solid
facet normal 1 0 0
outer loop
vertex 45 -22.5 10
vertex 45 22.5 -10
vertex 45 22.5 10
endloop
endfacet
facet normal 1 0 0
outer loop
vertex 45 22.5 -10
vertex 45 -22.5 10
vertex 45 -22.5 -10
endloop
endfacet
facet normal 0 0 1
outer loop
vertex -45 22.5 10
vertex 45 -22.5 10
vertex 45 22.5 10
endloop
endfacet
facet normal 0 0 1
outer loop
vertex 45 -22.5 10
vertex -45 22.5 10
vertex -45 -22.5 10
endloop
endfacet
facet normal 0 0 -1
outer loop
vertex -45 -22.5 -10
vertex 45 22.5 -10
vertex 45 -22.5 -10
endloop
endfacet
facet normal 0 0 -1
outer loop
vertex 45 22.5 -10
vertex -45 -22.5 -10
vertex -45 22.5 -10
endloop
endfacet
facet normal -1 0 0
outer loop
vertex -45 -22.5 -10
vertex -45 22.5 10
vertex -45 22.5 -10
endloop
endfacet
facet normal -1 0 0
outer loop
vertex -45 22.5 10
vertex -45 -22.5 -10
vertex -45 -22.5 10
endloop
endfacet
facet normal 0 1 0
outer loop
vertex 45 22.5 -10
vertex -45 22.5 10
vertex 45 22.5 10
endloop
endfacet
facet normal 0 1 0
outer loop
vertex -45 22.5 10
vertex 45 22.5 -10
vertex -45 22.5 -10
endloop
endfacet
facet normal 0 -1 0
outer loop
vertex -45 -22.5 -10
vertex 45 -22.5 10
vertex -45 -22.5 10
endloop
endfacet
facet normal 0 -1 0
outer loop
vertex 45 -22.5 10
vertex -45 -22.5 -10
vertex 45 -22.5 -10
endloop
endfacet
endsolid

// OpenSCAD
// Dimensions for the drying rack
$fn = 64; // Smooth curves

// Base block dimensions
base_length = 90;   // X direction
base_width = 45;    // Y direction
base_height = 20;     // Z direction

// Slot dimensions
slot_length = 77;     // Along X
slot_width = 1.6;     // Y direction (width of slot)
slot_depth = 10;      // Z direction (depth into top face)

// Spacing between slots (center-to-center in Y)
slot_spacing = 3.5;

// Number of slots
num_slots = 10;

// Calculate total width occupied by slots (center-to-center)
total_slot_width = (num_slots - 1) * slot_spacing + slot_width;

// Centering offset for slots in Y
y_offset = (base_width - total_slot_width) / 2;

// Centering offset for slots in X
x_offset = (base_length - slot_length) / 2;

// Create the base block
cube(size = [base_length, base_width, base_height], center = true);

// Cut the slots using difference
difference() {
    // Keep the base block
    cube(size = [base_length, base_width, base_height], center = true);

    // For each slot, create a rectangular prism to cut out
    for (i = [0 : num_slots - 1]) {
        // Calculate Y position of this slot (center-to-center spacing)
        y_pos = y_offset + i * slot_spacing;

        // Create a rectangular prism for the slot
        // Extend slightly beyond the top face to ensure clean cut
        translate([0, y_pos, base_height - slot_depth - 0.01]) {
            cube(size = [slot_length, slot_width + 0.02, slot_depth + 0.02], center = false);
        }
    }
}
